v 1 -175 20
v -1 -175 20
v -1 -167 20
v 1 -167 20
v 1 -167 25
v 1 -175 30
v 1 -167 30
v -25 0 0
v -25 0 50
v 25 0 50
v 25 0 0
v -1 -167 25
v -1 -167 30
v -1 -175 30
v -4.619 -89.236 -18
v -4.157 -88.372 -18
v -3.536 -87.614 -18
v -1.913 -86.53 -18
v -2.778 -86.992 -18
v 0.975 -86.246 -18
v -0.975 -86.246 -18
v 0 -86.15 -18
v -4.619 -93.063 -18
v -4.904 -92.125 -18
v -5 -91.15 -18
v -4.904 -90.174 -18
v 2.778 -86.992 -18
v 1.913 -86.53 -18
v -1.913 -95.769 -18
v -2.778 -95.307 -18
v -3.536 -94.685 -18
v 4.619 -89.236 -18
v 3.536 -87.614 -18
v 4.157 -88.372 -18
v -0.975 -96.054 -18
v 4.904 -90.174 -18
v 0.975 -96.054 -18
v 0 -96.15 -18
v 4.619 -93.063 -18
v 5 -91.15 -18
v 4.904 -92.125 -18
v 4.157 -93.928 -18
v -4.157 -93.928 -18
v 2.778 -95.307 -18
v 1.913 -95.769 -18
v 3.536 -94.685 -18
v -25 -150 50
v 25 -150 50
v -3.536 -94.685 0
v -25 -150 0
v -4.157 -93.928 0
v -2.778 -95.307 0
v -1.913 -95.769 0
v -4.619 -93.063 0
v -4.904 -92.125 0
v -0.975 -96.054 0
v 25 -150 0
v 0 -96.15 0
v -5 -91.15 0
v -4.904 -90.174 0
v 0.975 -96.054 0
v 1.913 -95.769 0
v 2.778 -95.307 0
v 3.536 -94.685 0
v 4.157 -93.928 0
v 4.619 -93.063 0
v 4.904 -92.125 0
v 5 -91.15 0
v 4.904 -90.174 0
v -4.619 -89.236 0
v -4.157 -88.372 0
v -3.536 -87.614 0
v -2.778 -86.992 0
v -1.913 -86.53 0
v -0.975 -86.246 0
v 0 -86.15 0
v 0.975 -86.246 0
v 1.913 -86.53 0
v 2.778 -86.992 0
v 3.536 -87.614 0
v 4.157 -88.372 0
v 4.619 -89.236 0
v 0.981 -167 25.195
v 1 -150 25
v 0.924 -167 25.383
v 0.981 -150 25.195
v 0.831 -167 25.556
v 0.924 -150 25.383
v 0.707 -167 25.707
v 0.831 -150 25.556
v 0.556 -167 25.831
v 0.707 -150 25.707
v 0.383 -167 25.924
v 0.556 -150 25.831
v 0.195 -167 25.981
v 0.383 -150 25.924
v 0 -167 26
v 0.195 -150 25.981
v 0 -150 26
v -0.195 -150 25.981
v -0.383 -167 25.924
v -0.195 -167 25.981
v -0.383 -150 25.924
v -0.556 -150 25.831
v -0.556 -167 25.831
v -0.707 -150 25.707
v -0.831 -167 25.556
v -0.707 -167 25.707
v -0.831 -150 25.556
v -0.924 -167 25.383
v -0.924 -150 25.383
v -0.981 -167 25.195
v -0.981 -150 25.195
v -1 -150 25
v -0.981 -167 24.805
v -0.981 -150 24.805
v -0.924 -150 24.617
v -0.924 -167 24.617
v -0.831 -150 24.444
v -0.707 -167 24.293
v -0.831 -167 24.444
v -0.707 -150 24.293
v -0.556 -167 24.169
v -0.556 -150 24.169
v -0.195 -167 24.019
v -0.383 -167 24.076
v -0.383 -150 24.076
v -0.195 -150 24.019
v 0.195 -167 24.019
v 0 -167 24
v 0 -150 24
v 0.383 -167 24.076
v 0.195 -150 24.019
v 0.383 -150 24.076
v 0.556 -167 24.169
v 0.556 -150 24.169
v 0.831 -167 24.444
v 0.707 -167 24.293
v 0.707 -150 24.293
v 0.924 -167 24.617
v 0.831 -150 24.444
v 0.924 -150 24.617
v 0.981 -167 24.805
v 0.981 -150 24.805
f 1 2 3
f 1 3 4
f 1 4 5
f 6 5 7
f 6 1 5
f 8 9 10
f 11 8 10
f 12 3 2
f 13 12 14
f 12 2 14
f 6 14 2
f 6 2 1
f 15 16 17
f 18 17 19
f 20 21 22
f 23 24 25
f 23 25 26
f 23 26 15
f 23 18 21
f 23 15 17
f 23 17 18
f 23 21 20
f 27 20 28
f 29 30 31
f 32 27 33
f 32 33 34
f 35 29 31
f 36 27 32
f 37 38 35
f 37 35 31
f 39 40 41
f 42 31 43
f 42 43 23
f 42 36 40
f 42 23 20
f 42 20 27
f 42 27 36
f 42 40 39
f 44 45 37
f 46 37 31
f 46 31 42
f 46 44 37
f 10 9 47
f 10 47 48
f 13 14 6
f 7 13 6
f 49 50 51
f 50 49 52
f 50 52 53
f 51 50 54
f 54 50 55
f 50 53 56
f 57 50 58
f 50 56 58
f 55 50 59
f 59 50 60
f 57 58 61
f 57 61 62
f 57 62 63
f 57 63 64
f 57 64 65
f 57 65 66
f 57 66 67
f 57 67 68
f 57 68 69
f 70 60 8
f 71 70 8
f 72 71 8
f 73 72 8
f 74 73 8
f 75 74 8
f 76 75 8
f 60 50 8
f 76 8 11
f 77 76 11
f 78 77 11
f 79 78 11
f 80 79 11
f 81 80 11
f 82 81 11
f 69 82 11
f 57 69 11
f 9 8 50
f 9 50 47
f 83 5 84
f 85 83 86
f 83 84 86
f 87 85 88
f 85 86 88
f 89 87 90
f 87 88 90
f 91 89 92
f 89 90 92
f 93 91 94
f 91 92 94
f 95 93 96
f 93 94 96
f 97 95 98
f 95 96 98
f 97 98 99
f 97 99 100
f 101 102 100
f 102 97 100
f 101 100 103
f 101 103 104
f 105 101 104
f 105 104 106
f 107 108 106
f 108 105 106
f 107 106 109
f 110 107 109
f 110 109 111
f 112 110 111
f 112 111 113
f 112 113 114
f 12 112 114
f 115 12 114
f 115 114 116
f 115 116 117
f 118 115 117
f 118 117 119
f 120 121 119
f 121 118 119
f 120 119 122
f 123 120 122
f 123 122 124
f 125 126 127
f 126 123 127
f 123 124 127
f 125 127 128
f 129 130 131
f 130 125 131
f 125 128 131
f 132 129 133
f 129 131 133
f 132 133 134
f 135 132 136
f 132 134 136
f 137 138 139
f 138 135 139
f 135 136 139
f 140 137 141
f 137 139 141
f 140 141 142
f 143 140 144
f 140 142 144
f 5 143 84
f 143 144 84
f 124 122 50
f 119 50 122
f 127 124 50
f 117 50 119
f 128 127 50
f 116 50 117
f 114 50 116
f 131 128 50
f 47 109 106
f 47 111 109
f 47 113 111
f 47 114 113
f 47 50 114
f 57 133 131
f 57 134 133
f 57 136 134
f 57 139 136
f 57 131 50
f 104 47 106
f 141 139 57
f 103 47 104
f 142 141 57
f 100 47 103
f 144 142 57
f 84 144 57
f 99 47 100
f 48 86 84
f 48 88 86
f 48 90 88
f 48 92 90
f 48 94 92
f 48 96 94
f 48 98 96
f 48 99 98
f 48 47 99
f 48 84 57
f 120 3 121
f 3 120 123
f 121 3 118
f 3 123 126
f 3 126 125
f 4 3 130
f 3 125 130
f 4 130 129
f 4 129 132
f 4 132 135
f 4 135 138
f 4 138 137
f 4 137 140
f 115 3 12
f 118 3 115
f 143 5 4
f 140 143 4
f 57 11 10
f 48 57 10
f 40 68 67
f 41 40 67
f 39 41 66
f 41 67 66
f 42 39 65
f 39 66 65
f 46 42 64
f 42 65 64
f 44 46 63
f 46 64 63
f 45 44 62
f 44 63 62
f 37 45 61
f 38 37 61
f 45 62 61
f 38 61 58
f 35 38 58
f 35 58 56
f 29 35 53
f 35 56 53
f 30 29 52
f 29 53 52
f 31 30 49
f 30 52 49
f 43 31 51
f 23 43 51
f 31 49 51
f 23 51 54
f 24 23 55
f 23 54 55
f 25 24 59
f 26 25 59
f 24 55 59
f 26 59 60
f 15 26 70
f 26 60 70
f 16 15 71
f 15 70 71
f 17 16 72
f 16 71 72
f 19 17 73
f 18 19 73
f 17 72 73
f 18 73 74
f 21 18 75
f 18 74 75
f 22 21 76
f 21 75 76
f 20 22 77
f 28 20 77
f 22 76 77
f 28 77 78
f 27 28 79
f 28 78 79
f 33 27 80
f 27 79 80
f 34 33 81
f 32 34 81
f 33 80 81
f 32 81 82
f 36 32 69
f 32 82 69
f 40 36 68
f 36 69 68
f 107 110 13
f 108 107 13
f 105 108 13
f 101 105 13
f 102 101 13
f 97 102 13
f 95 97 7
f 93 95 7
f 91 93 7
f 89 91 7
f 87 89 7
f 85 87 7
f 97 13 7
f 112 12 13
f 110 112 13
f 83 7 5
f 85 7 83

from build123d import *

# Parameters (mm, degrees)
F0_W     = 50
F0_H     = 50
F1_DEPTH = 150
F2_R     = 1
F3_DEPTH = 25
F4_W     = 2
F4_H     = 10
F5_DEPTH = 8
F6_R     = 5
F7_DEPTH = 18


with BuildPart() as f1:
    # F0 (on Front) → F1 (new body)
    with BuildSketch(Plane.XZ):
        with Locations((0, 25)):
            Rectangle(F0_W, F0_H)
    extrude(amount=F1_DEPTH)

    # F2 (on face) → F3 (join)
    with BuildSketch(Plane.XZ.offset(150)):
        with Locations((0, 25)):
            Circle(F2_R)
    extrude(amount=F3_DEPTH)

    # F4 (on face) → F5 (join)
    with BuildSketch(Plane.XZ.offset(175)):
        with Locations((0, 25)):
            Rectangle(F4_W, F4_H)
    extrude(amount=-F5_DEPTH)

    # F6 (on face) → F7 (join)
    with BuildSketch(Plane(origin=(0, 0, 0), x_dir=(1, 0, 0), z_dir=(0, 0, -1))):
        with Locations((0, 91.149837)):
            Circle(F6_R)
    extrude(amount=F7_DEPTH)


solid = f1.part
